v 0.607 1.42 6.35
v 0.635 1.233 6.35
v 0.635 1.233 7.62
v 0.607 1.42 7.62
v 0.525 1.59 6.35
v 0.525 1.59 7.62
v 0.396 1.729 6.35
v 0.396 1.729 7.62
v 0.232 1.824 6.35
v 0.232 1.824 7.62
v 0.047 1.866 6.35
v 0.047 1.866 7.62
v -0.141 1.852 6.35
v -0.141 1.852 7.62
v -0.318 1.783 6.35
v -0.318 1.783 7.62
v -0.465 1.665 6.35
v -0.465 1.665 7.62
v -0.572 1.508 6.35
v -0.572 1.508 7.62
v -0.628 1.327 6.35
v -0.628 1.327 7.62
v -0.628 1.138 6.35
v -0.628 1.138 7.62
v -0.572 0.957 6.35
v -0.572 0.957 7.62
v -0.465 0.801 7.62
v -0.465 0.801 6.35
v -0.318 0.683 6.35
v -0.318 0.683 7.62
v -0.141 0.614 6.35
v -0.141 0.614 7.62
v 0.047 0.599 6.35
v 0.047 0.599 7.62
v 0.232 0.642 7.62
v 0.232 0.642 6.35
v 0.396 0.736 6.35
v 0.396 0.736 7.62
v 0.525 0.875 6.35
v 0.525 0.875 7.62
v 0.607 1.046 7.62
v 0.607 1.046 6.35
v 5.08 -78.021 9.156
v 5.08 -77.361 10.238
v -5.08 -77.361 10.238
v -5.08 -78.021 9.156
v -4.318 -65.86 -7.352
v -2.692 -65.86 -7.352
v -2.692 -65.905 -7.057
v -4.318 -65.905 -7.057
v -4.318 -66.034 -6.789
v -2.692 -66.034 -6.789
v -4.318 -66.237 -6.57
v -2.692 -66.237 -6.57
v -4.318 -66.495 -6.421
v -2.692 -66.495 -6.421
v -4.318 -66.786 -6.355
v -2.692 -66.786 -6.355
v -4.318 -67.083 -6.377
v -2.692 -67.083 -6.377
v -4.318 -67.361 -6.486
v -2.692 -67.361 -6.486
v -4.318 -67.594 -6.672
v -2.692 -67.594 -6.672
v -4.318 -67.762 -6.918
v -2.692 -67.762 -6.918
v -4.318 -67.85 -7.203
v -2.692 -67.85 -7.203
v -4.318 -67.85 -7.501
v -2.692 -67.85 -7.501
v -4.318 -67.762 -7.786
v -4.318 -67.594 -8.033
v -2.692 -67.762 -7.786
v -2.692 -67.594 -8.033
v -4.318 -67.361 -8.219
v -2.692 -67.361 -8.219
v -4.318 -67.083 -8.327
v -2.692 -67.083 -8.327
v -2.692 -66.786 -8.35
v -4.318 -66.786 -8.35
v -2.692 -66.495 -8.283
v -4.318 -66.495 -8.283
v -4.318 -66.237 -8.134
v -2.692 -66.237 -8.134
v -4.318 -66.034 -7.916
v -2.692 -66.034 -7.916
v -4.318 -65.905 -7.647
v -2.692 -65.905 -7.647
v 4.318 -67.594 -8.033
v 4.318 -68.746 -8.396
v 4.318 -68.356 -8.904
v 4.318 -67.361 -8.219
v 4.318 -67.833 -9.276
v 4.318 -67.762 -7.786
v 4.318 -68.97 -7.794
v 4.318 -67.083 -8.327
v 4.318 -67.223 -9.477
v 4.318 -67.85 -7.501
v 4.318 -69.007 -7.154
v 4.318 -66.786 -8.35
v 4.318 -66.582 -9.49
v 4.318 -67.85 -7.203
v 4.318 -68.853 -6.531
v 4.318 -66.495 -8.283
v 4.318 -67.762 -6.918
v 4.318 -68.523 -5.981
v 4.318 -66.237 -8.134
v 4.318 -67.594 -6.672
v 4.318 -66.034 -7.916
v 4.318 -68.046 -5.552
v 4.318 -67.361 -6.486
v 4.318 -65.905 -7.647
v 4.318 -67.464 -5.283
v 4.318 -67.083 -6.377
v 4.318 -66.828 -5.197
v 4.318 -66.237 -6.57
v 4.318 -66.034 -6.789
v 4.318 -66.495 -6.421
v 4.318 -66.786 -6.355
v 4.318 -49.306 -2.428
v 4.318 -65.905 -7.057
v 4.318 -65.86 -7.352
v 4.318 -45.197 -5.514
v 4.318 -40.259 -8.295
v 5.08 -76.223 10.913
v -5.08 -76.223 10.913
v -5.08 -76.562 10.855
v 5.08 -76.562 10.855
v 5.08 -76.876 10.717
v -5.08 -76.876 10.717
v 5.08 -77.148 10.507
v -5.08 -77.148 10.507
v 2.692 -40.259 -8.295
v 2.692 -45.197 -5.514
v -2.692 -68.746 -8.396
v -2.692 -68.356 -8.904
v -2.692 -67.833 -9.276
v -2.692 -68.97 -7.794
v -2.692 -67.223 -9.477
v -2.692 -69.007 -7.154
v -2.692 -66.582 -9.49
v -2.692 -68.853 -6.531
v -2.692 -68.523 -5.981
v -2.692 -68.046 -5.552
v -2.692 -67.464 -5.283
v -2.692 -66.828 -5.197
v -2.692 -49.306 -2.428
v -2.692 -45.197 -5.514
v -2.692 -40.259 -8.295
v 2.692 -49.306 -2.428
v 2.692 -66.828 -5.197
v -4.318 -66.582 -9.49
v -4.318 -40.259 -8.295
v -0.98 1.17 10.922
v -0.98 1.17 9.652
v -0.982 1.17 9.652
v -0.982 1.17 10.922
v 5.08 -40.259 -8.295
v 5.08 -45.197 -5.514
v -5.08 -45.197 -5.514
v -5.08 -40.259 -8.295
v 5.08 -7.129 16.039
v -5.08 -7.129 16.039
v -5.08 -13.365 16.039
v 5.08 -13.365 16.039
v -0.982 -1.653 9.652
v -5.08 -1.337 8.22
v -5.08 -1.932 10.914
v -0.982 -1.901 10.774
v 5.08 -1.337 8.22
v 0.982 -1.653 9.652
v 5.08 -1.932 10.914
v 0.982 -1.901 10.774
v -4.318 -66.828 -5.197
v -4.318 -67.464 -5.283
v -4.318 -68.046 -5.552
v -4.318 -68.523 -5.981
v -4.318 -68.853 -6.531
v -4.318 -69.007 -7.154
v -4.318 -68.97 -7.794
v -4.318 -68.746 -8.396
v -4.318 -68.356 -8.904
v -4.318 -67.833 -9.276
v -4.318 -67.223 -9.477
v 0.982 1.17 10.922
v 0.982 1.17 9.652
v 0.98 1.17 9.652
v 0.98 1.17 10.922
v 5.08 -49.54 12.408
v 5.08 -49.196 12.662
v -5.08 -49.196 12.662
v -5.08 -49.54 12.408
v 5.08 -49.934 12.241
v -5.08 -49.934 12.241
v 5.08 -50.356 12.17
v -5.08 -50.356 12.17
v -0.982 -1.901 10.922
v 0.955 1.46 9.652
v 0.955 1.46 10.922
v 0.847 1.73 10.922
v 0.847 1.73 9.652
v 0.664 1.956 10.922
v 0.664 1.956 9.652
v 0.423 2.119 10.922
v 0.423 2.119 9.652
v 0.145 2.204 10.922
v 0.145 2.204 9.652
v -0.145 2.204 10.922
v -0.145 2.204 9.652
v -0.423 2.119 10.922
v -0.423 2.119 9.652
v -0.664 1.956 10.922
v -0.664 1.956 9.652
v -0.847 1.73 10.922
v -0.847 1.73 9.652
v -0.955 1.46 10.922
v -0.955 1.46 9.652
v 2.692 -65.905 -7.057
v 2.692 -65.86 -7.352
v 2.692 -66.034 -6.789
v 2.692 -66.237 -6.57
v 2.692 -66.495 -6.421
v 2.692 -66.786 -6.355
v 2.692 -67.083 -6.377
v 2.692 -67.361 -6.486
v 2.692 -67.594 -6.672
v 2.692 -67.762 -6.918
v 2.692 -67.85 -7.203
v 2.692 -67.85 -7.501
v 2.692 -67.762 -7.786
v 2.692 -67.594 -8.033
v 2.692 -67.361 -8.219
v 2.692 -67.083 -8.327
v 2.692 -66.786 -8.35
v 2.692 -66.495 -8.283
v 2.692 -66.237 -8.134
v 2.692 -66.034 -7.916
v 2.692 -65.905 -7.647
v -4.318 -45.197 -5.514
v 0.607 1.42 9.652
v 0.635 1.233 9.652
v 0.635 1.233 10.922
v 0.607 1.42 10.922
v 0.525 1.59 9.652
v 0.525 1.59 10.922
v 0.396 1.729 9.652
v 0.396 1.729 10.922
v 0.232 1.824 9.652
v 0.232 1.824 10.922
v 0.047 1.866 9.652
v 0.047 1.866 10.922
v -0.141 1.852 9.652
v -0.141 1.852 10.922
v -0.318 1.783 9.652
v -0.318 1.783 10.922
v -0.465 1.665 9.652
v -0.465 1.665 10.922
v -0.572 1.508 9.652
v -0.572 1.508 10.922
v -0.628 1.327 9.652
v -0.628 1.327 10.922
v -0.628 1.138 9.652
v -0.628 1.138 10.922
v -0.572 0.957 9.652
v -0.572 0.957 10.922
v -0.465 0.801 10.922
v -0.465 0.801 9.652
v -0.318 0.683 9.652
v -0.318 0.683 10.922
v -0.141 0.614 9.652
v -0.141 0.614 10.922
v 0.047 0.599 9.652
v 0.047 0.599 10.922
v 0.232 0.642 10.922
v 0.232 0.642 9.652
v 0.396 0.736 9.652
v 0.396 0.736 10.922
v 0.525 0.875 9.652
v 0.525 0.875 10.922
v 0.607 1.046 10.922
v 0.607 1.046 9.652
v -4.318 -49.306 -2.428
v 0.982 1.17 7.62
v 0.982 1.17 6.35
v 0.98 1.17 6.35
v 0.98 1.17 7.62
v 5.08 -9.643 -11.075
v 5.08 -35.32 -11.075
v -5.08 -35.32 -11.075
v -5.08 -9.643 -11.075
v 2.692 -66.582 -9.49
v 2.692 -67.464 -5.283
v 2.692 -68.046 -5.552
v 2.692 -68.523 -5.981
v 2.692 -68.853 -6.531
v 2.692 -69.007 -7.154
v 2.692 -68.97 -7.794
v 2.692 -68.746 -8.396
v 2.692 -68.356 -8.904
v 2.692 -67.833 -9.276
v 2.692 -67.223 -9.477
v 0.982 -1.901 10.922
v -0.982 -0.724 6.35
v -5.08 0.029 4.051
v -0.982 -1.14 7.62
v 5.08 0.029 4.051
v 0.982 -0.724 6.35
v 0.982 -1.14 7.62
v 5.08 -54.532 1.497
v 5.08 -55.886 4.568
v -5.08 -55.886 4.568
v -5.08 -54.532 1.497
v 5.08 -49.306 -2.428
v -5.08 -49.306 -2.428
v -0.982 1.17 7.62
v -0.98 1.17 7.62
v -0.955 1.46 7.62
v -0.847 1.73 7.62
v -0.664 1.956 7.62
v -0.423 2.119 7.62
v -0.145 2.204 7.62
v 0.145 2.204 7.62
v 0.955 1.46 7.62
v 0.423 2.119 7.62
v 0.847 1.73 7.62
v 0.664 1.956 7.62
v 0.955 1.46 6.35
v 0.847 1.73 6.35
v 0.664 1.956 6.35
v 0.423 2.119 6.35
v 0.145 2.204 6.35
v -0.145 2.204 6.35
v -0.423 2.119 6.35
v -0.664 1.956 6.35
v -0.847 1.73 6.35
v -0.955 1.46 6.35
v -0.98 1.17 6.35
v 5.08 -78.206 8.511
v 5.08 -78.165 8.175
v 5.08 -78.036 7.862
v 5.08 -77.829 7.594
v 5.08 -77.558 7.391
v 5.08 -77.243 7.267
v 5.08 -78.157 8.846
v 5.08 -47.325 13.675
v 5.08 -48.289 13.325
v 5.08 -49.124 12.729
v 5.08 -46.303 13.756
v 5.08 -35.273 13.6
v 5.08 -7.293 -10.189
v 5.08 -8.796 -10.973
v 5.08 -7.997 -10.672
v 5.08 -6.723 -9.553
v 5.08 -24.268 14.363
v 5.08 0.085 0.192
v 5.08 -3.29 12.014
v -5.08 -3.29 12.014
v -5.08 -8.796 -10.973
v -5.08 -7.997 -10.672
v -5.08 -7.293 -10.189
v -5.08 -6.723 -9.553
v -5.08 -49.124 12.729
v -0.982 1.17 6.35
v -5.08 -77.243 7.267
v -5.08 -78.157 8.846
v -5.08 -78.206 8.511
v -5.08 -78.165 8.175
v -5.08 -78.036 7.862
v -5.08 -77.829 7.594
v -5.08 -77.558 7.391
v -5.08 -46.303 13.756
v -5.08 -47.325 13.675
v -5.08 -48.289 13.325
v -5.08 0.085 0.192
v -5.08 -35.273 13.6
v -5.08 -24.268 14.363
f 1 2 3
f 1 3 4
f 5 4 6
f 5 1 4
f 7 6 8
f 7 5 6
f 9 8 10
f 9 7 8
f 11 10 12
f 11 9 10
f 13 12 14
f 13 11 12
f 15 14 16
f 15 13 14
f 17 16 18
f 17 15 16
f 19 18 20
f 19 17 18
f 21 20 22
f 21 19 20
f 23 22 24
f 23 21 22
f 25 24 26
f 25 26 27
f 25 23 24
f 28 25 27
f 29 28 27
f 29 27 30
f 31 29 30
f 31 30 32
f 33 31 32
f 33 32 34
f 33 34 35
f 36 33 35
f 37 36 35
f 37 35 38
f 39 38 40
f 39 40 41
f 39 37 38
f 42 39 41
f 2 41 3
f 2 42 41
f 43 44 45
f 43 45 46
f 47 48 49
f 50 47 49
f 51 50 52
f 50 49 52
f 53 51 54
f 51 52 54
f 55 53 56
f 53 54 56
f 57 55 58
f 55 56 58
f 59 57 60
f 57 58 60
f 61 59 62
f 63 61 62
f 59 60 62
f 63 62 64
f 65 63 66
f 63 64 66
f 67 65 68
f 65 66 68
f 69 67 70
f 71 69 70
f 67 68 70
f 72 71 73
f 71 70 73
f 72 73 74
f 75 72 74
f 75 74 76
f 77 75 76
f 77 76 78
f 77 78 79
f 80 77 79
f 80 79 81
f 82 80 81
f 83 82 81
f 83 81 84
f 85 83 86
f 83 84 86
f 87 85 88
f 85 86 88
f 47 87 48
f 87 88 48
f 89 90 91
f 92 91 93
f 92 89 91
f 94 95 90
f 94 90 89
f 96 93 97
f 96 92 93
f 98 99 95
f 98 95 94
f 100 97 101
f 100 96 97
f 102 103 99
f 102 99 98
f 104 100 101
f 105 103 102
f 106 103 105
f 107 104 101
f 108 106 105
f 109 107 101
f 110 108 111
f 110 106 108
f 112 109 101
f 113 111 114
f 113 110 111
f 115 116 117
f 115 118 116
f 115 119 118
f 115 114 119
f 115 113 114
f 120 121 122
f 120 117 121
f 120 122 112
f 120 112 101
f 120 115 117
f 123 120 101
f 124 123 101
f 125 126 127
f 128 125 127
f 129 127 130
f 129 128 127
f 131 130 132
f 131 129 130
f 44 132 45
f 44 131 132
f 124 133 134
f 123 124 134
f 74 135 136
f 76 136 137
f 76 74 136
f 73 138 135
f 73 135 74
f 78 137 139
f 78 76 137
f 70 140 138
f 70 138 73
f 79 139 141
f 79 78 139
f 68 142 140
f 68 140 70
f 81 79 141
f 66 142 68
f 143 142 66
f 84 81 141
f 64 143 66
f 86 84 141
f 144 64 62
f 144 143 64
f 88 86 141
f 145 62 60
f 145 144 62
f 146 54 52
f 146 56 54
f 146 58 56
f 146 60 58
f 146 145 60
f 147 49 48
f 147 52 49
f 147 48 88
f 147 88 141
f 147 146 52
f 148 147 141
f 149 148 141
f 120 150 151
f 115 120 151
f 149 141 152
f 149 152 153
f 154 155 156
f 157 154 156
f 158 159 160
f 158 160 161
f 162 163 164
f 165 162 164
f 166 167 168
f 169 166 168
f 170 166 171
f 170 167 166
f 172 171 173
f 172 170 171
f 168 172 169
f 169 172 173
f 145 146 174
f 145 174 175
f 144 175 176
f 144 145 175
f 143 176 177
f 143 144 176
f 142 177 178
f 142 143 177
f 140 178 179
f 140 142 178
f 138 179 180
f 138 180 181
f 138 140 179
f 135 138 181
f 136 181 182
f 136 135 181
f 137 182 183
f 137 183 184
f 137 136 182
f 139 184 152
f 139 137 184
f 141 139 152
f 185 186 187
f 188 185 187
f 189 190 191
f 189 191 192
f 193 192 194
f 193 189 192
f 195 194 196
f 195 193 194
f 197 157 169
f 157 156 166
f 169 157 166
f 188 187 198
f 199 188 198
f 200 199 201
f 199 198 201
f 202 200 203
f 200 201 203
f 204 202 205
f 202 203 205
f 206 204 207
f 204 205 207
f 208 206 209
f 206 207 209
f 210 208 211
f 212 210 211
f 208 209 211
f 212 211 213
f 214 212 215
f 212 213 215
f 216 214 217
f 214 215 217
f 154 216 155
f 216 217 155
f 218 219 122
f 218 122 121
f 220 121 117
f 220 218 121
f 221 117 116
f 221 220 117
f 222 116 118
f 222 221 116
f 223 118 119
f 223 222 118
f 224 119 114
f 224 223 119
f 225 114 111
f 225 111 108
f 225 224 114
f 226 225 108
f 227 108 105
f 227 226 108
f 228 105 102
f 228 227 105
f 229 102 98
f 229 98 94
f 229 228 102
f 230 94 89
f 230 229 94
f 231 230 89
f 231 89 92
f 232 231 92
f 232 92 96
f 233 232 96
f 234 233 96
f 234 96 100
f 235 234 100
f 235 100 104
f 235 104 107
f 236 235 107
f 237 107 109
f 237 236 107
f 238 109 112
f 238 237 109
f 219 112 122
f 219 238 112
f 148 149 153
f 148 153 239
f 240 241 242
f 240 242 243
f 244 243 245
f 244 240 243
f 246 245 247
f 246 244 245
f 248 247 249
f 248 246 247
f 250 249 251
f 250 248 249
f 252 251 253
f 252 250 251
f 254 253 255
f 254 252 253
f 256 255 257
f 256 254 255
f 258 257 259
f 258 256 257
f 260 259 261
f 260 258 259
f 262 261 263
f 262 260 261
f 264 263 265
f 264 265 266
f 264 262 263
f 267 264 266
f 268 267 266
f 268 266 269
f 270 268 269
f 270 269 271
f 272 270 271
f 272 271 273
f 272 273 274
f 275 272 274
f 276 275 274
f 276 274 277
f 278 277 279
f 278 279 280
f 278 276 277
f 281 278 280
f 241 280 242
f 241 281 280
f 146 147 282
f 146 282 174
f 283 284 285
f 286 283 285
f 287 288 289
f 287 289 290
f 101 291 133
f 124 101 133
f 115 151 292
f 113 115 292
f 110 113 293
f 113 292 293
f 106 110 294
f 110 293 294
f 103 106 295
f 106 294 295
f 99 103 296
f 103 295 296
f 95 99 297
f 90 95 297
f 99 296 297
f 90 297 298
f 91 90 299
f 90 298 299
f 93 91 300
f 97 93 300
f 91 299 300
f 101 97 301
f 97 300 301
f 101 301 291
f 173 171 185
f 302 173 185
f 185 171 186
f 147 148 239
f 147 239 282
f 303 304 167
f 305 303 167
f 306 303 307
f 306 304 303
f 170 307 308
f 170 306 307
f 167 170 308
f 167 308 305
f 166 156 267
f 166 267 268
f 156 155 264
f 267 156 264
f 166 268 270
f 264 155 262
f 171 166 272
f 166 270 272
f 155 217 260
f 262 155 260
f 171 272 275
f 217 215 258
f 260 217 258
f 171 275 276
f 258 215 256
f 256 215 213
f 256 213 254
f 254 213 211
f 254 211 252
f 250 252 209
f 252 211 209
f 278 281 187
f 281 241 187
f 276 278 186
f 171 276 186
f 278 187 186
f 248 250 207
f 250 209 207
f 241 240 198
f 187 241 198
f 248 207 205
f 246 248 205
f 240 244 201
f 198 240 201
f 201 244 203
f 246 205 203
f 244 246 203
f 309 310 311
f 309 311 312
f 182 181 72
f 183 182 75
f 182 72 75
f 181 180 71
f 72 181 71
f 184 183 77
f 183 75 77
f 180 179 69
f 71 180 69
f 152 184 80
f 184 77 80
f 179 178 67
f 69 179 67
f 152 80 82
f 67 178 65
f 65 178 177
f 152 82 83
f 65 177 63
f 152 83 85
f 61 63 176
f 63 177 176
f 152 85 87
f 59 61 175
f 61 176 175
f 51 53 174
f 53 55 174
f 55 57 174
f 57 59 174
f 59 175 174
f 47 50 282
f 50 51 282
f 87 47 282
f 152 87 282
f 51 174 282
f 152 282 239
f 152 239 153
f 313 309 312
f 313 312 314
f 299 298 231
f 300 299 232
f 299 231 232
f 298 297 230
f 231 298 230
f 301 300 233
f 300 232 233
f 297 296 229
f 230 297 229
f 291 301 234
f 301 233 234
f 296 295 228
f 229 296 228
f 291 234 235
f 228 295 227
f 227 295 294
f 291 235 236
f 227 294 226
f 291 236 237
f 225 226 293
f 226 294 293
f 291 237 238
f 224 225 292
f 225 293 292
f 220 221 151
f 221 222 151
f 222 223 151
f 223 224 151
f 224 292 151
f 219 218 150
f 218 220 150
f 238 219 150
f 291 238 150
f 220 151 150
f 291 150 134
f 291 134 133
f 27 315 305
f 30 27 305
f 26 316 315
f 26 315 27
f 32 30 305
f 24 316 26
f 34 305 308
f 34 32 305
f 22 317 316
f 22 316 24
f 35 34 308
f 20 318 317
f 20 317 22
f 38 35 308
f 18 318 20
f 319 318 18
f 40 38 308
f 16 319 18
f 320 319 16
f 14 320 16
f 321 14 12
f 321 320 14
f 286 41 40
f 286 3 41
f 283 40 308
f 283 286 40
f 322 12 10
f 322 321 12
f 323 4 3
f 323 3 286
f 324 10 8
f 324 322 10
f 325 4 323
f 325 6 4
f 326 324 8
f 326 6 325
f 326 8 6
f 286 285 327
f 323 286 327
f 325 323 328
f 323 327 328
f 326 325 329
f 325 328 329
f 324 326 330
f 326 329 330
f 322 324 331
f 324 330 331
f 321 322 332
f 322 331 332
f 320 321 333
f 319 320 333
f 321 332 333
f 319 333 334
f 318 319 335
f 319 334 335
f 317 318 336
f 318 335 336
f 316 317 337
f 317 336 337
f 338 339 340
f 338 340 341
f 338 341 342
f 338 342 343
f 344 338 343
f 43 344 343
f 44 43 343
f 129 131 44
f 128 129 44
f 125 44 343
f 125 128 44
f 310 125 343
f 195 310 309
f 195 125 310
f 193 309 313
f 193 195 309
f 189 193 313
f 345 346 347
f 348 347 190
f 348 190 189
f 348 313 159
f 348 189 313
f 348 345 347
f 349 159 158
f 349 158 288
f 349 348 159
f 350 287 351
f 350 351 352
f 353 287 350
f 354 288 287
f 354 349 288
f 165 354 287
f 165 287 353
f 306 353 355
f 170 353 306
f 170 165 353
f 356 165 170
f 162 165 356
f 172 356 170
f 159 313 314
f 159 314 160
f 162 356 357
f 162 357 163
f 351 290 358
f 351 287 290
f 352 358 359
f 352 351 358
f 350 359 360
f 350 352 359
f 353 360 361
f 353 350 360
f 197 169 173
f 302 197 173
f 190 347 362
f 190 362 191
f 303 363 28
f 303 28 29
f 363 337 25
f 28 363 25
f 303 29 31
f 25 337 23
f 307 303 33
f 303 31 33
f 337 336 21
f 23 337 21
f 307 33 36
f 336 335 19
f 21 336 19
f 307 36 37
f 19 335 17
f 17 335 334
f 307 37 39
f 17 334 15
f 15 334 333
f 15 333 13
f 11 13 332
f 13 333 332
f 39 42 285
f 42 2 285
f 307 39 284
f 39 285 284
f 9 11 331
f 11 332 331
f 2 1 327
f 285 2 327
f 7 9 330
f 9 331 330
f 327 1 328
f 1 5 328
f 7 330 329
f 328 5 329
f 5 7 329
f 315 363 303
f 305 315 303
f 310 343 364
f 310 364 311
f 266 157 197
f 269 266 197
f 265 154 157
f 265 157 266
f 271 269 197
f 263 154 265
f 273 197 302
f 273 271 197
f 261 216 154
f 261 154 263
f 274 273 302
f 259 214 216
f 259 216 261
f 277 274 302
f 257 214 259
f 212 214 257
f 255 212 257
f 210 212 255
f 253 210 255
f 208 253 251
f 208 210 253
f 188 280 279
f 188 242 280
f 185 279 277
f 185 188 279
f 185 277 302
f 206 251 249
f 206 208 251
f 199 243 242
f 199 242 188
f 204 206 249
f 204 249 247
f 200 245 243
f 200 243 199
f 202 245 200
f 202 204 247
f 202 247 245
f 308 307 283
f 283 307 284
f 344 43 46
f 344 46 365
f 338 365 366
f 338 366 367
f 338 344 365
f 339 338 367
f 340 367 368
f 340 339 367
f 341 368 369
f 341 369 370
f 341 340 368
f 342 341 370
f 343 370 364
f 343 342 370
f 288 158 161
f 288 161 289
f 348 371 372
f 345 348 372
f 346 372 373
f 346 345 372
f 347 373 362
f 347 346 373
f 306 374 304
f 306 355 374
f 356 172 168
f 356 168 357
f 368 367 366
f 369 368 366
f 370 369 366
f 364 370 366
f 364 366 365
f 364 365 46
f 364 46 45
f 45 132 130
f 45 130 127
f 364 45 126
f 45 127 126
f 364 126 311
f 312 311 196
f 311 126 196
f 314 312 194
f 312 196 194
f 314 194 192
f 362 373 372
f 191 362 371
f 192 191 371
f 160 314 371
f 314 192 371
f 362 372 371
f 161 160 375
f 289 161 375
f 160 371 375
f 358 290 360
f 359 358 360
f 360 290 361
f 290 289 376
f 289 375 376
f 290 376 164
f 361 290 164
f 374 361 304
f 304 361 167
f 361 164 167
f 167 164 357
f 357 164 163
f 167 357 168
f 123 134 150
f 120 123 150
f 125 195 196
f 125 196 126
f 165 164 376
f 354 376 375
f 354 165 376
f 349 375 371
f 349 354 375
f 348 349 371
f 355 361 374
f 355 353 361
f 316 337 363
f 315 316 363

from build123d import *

# Parameters (mm, degrees)
F1_DEPTH      = 5.08
F1_DEPTH_BACK = 5.08
F2_START      = 2.6924
F0_R          = 1.0003723125
F2_DEPTH      = 1.6256
F5_START      = 9.652
F4_R          = 0.635
F5_DEPTH      = 1.27
F6_START      = 6.35
F6_DEPTH      = 1.27


with BuildPart() as f1:
    # F0 (on Right) → F1 (new body, two sides)
    with BuildSketch(Plane.YZ) as f1_sk:
        with BuildLine():
            Line((0.0852813464, 0.1919296192), (0.0287976927, 4.0513155982))
            Line((0.0287976927, 4.0513155982), (-1.336822079, 8.2203539118))
            Line((-1.336822079, 8.2203539118), (-1.9315851387, 10.914305225))
            Line((-1.9315851387, 10.914305225), (-3.2904522843, 12.013522602))
            Line((-3.2904522843, 12.013522602), (-7.1285278888, 16.0394304962))
            Line((-7.1285278888, 16.0394304962), (-13.3653870204, 16.0394304962))
            ThreePointArc((-13.3653870204, 16.0394304962), (-29.7626529342, 13.8664815487), (-46.3029045757, 13.7564260577))
            ThreePointArc((-46.3029045757, 13.7564260577), (-47.8190863835, 13.5325193665), (-49.1243677886, 12.7292871869))
            Line((-49.1243677886, 12.7292871869), (-49.1957577746, 12.6622238566))
            ThreePointArc((-49.1957577746, 12.6622238566), (-49.7319383294, 12.3126553679), (-50.3558819852, 12.1698897204))
            Line((-50.3558819852, 12.1698897204), (-76.2232715204, 10.9134739549))
            ThreePointArc((-76.2232715204, 10.9134739549), (-76.8763540697, 10.7170137111), (-77.3614025915, 10.237595965))
            Line((-77.3614025915, 10.237595965), (-78.0212117411, 9.1555053464))
            ThreePointArc((-78.0212117411, 9.1555053464), (-78.1109393732, 8.0141207108), (-77.2434551545, 7.2669386283))
            Line((-77.2434551545, 7.2669386283), (-55.8863058686, 4.5678056777))
            Line((-55.8863058686, 4.5678056777), (-54.5319553308, 1.4966176624))
            Line((-54.5319553308, 1.4966176624), (-49.3058934109, -2.4282623857))
            Line((-49.3058934109, -2.4282623857), (-45.1969819986, -5.514139413))
            Line((-45.1969819986, -5.514139413), (-40.2585836646, -8.2946047065))
            Line((-40.2585836646, -8.2946047065), (-35.3201853305, -11.07507))
            Line((-35.3201853305, -11.07507), (-9.6430980807, -11.07507))
            ThreePointArc((-9.6430980807, -11.07507), (-7.9967951351, -10.6717705814), (-6.7233083962, -9.5532021501))
            Line((-6.7233083962, -9.5532021501), (0.0852813464, 0.1919296192))
        make_face()
    extrude(amount=F1_DEPTH)
    extrude(f1_sk.sketch, amount=-F1_DEPTH_BACK)

    # F4 (on Top) → F5 (join)
    with BuildSketch(Plane.XY.offset(F5_START)):
        with BuildLine():
            Line((-0.9820741736, 1.1704666201), (-0.9820741736, -1.900618134))
            Line((-0.9820741736, -1.900618134), (0.9820741736, -1.900618134))
            Line((0.9820741736, -1.900618134), (0.9820741736, 1.1704666201))
            Line((0.9820741736, 1.1704666201), (0.9800161632, 1.1704666201))
            ThreePointArc((0.9800161632, 1.1704666201), (0, 2.2146743084), (-0.9800161632, 1.1704666201))
            Line((-0.9800161632, 1.1704666201), (-0.9820741736, 1.1704666201))
        make_face()
        with Locations((0, 1.2326850933)):
            Circle(F4_R, mode=Mode.SUBTRACT)
    extrude(amount=F5_DEPTH)

    # F4 (on Top) → F6 (join)
    with BuildSketch(Plane.XY.offset(F6_START)):
        with BuildLine():
            Line((-0.9820741736, 1.1704666201), (-0.9820741736, -1.900618134))
            Line((-0.9820741736, -1.900618134), (0.9820741736, -1.900618134))
            Line((0.9820741736, -1.900618134), (0.9820741736, 1.1704666201))
            Line((0.9820741736, 1.1704666201), (0.9800161632, 1.1704666201))
            ThreePointArc((0.9800161632, 1.1704666201), (0, 2.2146743084), (-0.9800161632, 1.1704666201))
            Line((-0.9800161632, 1.1704666201), (-0.9820741736, 1.1704666201))
        make_face()
        with Locations((0, 1.2326850933)):
            Circle(F4_R, mode=Mode.SUBTRACT)
    extrude(amount=F6_DEPTH)


with BuildPart() as f2:
    # F0 (on Right) → F2 (new body)
    with BuildSketch(Plane.YZ.offset(F2_START)):
        with BuildLine():
            Line((-66.5820820244, -9.489505192), (-40.2585836646, -8.2946047065))
            Line((-40.2585836646, -8.2946047065), (-45.1969819986, -5.514139413))
            Line((-45.1969819986, -5.514139413), (-49.3058934109, -2.4282623857))
            Line((-49.3058934109, -2.4282623857), (-66.8277770233, -5.1970989376))
            ThreePointArc((-66.8277770233, -5.1970989376), (-69.0123388798, -7.4753769211), (-66.5820820244, -9.489505192))
        make_face()
        with Locations((-66.8605044484, -7.3522070888)):
            Circle(F0_R, mode=Mode.SUBTRACT)
    extrude(amount=F2_DEPTH)


with BuildPart() as f3_1:
    # F3: instance of F2
    add(f2.part.mirror(Plane.YZ))


solid = Compound([f1.part, f2.part, f3_1.part])
